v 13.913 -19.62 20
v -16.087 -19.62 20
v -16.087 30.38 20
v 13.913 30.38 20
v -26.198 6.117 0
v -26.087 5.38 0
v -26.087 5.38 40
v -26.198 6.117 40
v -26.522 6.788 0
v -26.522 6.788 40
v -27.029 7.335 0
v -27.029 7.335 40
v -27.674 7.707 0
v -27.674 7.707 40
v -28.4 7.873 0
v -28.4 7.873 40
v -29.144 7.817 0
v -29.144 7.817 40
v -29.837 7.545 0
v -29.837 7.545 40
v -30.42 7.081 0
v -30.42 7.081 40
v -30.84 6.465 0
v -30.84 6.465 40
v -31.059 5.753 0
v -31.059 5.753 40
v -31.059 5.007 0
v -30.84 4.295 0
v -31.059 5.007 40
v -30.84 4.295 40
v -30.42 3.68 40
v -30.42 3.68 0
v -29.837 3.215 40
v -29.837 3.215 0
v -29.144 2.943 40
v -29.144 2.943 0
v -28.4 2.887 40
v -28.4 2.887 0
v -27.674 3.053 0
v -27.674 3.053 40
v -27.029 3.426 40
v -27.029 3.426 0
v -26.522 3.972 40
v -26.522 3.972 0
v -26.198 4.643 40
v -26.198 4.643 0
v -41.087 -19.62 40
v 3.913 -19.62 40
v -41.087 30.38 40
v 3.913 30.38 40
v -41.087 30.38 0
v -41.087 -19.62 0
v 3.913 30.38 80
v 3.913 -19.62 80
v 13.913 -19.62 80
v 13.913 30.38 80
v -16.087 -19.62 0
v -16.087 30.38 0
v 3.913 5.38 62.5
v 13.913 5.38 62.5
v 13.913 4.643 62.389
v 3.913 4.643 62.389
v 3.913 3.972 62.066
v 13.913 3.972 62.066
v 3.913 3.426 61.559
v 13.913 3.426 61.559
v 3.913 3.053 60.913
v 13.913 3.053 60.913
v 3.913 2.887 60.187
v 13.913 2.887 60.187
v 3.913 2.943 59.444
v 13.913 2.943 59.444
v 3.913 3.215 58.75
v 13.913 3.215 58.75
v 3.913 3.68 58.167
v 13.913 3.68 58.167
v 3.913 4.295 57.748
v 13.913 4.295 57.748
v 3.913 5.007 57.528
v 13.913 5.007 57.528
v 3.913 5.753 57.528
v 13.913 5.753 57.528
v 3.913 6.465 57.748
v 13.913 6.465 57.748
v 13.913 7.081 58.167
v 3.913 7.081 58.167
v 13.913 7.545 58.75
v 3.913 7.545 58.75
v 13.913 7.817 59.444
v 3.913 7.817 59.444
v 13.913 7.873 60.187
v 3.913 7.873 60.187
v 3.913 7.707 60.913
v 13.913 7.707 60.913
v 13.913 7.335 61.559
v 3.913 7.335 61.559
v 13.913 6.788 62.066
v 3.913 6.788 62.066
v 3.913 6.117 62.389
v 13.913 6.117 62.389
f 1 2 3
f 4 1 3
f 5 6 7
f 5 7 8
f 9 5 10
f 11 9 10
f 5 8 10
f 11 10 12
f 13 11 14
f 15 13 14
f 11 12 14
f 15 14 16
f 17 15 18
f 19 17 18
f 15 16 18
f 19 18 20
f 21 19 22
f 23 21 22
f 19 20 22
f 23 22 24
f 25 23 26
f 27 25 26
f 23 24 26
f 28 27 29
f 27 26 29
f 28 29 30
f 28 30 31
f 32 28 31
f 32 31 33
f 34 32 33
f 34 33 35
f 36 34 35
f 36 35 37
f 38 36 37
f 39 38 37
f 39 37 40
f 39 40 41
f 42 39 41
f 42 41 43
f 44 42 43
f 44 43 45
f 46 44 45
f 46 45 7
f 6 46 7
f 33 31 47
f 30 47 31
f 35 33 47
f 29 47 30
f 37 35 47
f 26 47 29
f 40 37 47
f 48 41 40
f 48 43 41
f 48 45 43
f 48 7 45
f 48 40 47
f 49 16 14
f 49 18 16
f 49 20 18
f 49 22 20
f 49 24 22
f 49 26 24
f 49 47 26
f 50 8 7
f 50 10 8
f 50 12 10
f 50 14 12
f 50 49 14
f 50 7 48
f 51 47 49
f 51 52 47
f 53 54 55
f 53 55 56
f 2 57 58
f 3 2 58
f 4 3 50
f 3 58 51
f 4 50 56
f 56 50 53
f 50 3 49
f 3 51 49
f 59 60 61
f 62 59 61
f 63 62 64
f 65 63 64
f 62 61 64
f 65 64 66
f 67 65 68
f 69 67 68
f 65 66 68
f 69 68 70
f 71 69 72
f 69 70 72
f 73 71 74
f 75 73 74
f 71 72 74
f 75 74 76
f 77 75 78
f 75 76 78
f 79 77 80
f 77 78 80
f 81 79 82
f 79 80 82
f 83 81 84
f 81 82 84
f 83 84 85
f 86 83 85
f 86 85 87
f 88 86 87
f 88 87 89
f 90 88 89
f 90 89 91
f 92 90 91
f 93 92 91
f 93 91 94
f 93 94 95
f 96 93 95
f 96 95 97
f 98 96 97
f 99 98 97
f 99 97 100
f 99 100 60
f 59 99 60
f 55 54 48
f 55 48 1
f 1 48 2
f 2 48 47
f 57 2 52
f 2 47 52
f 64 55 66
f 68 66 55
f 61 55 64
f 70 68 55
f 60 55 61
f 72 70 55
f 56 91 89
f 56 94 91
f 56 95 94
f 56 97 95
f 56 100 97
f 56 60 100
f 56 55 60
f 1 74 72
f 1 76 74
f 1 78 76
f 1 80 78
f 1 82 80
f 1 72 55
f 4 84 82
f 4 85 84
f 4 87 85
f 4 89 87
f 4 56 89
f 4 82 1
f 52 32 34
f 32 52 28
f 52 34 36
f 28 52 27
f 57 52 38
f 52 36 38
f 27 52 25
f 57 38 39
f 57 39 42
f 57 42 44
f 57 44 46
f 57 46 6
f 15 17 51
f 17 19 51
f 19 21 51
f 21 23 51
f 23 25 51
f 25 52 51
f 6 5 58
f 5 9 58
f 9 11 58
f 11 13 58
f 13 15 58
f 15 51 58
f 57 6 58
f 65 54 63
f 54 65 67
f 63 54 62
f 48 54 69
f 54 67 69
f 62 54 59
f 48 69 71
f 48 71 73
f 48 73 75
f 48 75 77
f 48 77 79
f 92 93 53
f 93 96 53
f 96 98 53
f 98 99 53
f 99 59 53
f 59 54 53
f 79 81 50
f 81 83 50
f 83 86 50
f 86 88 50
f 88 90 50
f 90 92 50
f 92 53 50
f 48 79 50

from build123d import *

# Parameters (mm, degrees)
CROQUIS1_W                                     = 25
CROQUIS1_H                                     = 50
SALIENTE_EXTRUIR1_DEPTH                        = 20
CROQUIS2_W                                     = 45
CROQUIS2_H                                     = 50
SALIENTE_EXTRUIR2_DEPTH                        = 20
CROQUIS5_W                                     = 20
CROQUIS5_H                                     = 50
CROQUIS5_W_2                                   = 40
SALIENTE_EXTRUIR3_DEPTH                        = 10
PERFORADOR_PARA_ROSCAR_PARA_MACHO_DE_ROS_D     = 5
PERFORADOR_PARA_ROSCAR_PARA_MACHO_DE_ROS_DEPTH = 11
PERFORADOR_PARA_ROSCAR_PARA_MACHO_DE_ROS_TIP   = 1.502151548
PERFORADOR_PARA_ROSCAR_PARA_MACHO_DE_2_D       = 5


with BuildPart() as part:
    # Croquis1 → Saliente-Extruir1 (new body)
    with BuildSketch(Plane.XY):
        with Locations((-28.587290739, 5.380089213)):
            Rectangle(CROQUIS1_W, CROQUIS1_H)
    extrude(amount=SALIENTE_EXTRUIR1_DEPTH)

    # Croquis2 → Saliente-Extruir2 (add)
    with BuildSketch(Plane.XY.offset(20)):
        with Locations((-18.587290739, 5.380089213)):
            Rectangle(CROQUIS2_W, CROQUIS2_H)
    extrude(amount=SALIENTE_EXTRUIR2_DEPTH)

    # Croquis5 → Saliente-Extruir3 (add)
    with BuildSketch(Plane(origin=(3.912709261, 0, 0), x_dir=(0, 0, -1), z_dir=(1, 0, 0))):
        with Locations((-30, 5.380089213)):
            Rectangle(CROQUIS5_W, CROQUIS5_H)
        with Locations((-60, 5.380089213)):
            Rectangle(CROQUIS5_W_2, CROQUIS5_H)
    extrude(amount=SALIENTE_EXTRUIR3_DEPTH)

    # Perforador para roscar para macho de ros
    with Locations(Plane(origin=(3.912709261, 5.380089213, 60), x_dir=(0, 0, -1), z_dir=(-1, 0, 0))):
        with Locations((0, 0)):
            Hole(PERFORADOR_PARA_ROSCAR_PARA_MACHO_DE_ROS_D / 2, depth=PERFORADOR_PARA_ROSCAR_PARA_MACHO_DE_ROS_DEPTH)
            with Locations((0, 0, -(PERFORADOR_PARA_ROSCAR_PARA_MACHO_DE_ROS_DEPTH + PERFORADOR_PARA_ROSCAR_PARA_MACHO_DE_ROS_TIP / 2))):  # 118° drill point
                Cone(0, PERFORADOR_PARA_ROSCAR_PARA_MACHO_DE_ROS_D / 2, PERFORADOR_PARA_ROSCAR_PARA_MACHO_DE_ROS_TIP, mode=Mode.SUBTRACT)

    # Perforador para roscar para macho de 2 (through all)
    with Locations(Plane(origin=(-28.587290739, 5.380089213, 0), x_dir=(-1, 0, 0), z_dir=(0, 0, -1))):
        with Locations((0, 0)):
            Hole(PERFORADOR_PARA_ROSCAR_PARA_MACHO_DE_2_D / 2)


solid = part.part
